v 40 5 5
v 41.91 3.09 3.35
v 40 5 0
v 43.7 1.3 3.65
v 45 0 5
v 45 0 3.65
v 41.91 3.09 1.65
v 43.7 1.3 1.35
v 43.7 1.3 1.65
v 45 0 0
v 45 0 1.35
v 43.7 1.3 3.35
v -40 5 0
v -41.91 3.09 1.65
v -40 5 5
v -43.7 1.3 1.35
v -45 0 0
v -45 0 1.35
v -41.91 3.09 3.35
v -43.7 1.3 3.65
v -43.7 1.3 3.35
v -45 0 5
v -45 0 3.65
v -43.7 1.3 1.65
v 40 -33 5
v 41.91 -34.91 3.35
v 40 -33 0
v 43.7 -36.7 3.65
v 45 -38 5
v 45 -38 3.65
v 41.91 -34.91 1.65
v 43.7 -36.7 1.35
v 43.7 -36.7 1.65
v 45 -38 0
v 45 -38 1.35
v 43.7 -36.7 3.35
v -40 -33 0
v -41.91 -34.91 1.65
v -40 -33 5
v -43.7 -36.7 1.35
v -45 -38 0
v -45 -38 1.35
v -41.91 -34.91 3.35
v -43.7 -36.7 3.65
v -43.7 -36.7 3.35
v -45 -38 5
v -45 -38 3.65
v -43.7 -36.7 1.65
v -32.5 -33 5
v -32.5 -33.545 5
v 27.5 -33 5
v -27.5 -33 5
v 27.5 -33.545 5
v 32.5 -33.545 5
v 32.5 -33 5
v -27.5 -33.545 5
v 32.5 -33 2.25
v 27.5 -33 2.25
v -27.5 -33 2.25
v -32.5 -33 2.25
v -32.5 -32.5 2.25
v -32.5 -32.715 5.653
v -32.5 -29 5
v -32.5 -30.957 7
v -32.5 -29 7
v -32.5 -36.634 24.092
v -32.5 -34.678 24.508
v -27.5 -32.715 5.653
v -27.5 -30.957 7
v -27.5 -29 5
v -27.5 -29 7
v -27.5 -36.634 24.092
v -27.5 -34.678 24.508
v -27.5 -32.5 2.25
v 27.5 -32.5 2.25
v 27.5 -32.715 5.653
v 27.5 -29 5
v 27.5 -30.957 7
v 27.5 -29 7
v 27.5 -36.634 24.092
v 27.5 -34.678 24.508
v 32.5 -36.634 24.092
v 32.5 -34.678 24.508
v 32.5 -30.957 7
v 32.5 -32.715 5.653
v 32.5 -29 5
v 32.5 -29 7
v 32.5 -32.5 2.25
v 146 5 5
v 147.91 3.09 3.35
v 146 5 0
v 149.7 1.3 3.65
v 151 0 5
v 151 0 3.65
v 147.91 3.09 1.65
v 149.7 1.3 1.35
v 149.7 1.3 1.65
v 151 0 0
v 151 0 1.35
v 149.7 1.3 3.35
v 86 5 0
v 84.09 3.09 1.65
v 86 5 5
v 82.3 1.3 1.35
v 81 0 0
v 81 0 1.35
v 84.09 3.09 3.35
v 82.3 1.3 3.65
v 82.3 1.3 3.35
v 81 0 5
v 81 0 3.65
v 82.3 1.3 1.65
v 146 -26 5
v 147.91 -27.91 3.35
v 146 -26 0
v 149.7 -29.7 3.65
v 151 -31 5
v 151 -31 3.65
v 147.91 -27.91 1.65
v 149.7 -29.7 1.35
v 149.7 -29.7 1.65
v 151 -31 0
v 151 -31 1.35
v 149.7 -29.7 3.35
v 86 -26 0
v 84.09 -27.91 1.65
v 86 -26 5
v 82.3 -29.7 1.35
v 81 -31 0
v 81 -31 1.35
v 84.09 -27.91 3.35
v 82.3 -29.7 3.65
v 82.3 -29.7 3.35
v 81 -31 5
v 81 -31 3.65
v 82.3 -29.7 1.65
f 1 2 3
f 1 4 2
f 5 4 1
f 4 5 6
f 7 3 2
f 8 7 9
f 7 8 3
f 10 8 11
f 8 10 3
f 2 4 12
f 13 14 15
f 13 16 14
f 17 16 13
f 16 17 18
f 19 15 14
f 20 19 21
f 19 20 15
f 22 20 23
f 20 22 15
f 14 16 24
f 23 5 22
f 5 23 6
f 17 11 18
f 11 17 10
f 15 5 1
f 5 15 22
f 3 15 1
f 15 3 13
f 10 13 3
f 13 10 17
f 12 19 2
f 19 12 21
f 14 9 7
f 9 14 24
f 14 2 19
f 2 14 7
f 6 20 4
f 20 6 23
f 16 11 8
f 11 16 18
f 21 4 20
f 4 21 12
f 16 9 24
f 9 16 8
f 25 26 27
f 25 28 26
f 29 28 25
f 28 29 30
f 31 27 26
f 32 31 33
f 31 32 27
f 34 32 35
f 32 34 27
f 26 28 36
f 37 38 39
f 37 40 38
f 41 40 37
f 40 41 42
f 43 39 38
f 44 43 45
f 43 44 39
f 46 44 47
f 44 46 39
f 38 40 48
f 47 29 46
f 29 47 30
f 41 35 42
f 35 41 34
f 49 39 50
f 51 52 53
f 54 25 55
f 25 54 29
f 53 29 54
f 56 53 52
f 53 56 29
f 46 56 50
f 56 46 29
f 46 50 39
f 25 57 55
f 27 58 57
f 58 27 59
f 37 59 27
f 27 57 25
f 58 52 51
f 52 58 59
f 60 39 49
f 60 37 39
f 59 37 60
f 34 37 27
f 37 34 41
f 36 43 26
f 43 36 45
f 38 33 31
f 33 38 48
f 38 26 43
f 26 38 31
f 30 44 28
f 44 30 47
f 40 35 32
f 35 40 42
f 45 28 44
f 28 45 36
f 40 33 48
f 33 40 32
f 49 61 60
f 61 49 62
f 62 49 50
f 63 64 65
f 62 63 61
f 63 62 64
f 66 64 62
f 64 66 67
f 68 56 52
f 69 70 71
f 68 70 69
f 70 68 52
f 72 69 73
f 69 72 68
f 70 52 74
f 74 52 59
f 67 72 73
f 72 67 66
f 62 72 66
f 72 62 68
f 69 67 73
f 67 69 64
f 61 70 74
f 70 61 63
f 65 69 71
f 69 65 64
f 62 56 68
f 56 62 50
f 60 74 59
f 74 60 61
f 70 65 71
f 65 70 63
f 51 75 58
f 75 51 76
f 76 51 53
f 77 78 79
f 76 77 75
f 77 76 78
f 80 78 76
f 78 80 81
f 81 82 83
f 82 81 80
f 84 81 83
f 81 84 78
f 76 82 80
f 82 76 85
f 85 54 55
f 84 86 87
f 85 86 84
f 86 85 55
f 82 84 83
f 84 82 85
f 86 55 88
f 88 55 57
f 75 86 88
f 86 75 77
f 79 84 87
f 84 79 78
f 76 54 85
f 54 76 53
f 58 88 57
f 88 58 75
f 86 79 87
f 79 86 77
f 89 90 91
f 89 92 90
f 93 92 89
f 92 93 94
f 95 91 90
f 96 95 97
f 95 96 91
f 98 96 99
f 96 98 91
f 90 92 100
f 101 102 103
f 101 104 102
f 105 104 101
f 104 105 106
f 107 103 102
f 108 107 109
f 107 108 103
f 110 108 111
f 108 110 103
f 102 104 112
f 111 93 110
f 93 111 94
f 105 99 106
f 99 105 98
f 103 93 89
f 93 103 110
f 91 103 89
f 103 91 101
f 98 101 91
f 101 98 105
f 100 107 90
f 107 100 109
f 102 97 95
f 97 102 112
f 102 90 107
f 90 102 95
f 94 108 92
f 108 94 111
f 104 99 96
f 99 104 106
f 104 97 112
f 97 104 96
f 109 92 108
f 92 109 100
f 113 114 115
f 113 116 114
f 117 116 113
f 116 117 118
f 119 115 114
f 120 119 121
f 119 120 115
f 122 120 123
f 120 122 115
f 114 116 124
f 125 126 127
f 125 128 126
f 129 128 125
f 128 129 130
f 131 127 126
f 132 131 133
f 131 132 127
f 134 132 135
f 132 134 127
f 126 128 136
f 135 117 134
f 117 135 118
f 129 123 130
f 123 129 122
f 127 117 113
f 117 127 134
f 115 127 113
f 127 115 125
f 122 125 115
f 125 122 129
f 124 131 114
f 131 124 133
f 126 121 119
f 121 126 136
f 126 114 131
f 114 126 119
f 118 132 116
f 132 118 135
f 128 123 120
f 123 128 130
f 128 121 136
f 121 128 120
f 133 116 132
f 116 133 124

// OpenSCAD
// Updated: legs moved to OUTER side (Y>rail_w) so they never intrude into the PCB channel,
// and legs are angled for stability.
//
// Only the bottom rail has legs.

pcb_x = 90;
pcb_y = 70;
pcb_t = 1.5;

rail_w = 5;
rail_z = 5;

slot_clear = 0.1;
slot_z     = pcb_t + 2*slot_clear;
slot_depth = 3;

// Legs (bottom rail only)
legs_enable = true;
leg_w     = 5.0;   // along rail length (X)
leg_th    = 2.0;    // thickness (Y direction for brace pieces)
leg_len   = 20.0;   // how far back in Z
leg_drop  = 0.0;    // unused now (kept for compatibility)
leg_inset = 15.0;   // from each end
leg_angle_deg = 12; // tilt legs backward (more stable)
leg_y_out = 3.0;    // how far OUTSIDE the frame (beyond rail_w) the leg root sits
leg_y_span= 2.0;   // leg "height" in Y (downward/foot extent)

mode = "print_plate"; // "print_plate","assembly_preview","top","bottom","left","right"

Lx = pcb_x;
Ly = pcb_y;

module rail_outline_2d(L){
  polygon(points=[
    [-L/2,           0],
    [ L/2,           0],
    [ L/2 - rail_w,  rail_w],
    [-L/2 + rail_w,  rail_w]
  ]);
}

module rail_solid(L){
  linear_extrude(height=rail_z, center=true)
    rail_outline_2d(L);
}

module rail_with_channel(L){
  difference(){
    rail_solid(L);

    // Channel: open at inner edge (Y=0), extends to +Y by slot_depth, height slot_z in Z.
    translate([0, slot_depth/2 - 0.01, 0])
      cube([L + 2, slot_depth + 0.2, slot_z], center=true);

    // Flared mouth
    translate([0, 0.6, 0])
      cube([L + 2, 1.4, slot_z + 0.6], center=true);
  }
}

// Angled leg: attaches OUTSIDE the rail (Y > rail_w), never crosses Y=0..slot_depth region.
module angled_leg_at(xpos){
  // Root position on the OUTER side of the rail
  y0 = rail_w + leg_y_out;
  z0 = rail_z/2; // start near back surface

  // Leg is a rectangular prism rotated about X to tilt backward.
  // Rotate around X changes Y/Z, giving a more stable base.
  translate([xpos, y0, 0])
    rotate([leg_angle_deg, 0, 0])
      translate([0, -leg_y_span/2, rail_z/2 + leg_len/2])
        cube([leg_w, leg_y_span, leg_len], center=true);

  // Brace (a small triangular-ish hull) from outer rail face to leg
  hull(){
    translate([xpos, rail_w*0.90, rail_z*0.15])
      cube([leg_w, leg_th, leg_th], center=true);
    translate([xpos, y0, rail_z/2 + leg_th/2])
      cube([leg_w, leg_th, leg_th], center=true);
  }
}

module rail_part(L, is_bottom=false){
  rail_with_channel(L);

  if (is_bottom && legs_enable){
    for (sx=[-1,1]){
      x = sx*(L/2 - leg_inset);
      angled_leg_at(x);
    }
  }
}

module top_rail()    { rail_part(Lx, is_bottom=false); }
module bottom_rail() { rail_part(Lx, is_bottom=true ); }
module left_rail()   { rail_part(Ly, is_bottom=false); }
module right_rail()  { rail_part(Ly, is_bottom=false); }

module assembly_preview(){
  color([0,0.6,0,0.35]) cube([pcb_x, pcb_y, pcb_t], center=true);

  translate([0, +pcb_y/2, 0]) top_rail();
  translate([0, -pcb_y/2, 0]) rotate([0,0,180]) bottom_rail();
  translate([+pcb_x/2, 0, 0]) rotate([0,0,-90]) right_rail();
  translate([-pcb_x/2, 0, 0]) rotate([0,0, 90]) left_rail();
}

module print_plate(){
  zlift = rail_z/2;
  gap = 26;

  y_plain = rail_w;
  y_leg   = rail_w + leg_y_out + leg_y_span + 2; // conservative

  translate([0, 0, zlift]) top_rail();
  translate([0, -(max(y_plain,y_leg)+gap), zlift]) bottom_rail();

  xshift = max(Lx, Ly) + gap;
  translate([xshift, 0, zlift]) left_rail();
  translate([xshift, -(y_plain+gap), zlift]) right_rail();
}

if (mode=="print_plate")           print_plate();
else if (mode=="assembly_preview") assembly_preview();
else if (mode=="top")              top_rail();
else if (mode=="bottom")           bottom_rail();
else if (mode=="left")             left_rail();
else if (mode=="right")            right_rail();
